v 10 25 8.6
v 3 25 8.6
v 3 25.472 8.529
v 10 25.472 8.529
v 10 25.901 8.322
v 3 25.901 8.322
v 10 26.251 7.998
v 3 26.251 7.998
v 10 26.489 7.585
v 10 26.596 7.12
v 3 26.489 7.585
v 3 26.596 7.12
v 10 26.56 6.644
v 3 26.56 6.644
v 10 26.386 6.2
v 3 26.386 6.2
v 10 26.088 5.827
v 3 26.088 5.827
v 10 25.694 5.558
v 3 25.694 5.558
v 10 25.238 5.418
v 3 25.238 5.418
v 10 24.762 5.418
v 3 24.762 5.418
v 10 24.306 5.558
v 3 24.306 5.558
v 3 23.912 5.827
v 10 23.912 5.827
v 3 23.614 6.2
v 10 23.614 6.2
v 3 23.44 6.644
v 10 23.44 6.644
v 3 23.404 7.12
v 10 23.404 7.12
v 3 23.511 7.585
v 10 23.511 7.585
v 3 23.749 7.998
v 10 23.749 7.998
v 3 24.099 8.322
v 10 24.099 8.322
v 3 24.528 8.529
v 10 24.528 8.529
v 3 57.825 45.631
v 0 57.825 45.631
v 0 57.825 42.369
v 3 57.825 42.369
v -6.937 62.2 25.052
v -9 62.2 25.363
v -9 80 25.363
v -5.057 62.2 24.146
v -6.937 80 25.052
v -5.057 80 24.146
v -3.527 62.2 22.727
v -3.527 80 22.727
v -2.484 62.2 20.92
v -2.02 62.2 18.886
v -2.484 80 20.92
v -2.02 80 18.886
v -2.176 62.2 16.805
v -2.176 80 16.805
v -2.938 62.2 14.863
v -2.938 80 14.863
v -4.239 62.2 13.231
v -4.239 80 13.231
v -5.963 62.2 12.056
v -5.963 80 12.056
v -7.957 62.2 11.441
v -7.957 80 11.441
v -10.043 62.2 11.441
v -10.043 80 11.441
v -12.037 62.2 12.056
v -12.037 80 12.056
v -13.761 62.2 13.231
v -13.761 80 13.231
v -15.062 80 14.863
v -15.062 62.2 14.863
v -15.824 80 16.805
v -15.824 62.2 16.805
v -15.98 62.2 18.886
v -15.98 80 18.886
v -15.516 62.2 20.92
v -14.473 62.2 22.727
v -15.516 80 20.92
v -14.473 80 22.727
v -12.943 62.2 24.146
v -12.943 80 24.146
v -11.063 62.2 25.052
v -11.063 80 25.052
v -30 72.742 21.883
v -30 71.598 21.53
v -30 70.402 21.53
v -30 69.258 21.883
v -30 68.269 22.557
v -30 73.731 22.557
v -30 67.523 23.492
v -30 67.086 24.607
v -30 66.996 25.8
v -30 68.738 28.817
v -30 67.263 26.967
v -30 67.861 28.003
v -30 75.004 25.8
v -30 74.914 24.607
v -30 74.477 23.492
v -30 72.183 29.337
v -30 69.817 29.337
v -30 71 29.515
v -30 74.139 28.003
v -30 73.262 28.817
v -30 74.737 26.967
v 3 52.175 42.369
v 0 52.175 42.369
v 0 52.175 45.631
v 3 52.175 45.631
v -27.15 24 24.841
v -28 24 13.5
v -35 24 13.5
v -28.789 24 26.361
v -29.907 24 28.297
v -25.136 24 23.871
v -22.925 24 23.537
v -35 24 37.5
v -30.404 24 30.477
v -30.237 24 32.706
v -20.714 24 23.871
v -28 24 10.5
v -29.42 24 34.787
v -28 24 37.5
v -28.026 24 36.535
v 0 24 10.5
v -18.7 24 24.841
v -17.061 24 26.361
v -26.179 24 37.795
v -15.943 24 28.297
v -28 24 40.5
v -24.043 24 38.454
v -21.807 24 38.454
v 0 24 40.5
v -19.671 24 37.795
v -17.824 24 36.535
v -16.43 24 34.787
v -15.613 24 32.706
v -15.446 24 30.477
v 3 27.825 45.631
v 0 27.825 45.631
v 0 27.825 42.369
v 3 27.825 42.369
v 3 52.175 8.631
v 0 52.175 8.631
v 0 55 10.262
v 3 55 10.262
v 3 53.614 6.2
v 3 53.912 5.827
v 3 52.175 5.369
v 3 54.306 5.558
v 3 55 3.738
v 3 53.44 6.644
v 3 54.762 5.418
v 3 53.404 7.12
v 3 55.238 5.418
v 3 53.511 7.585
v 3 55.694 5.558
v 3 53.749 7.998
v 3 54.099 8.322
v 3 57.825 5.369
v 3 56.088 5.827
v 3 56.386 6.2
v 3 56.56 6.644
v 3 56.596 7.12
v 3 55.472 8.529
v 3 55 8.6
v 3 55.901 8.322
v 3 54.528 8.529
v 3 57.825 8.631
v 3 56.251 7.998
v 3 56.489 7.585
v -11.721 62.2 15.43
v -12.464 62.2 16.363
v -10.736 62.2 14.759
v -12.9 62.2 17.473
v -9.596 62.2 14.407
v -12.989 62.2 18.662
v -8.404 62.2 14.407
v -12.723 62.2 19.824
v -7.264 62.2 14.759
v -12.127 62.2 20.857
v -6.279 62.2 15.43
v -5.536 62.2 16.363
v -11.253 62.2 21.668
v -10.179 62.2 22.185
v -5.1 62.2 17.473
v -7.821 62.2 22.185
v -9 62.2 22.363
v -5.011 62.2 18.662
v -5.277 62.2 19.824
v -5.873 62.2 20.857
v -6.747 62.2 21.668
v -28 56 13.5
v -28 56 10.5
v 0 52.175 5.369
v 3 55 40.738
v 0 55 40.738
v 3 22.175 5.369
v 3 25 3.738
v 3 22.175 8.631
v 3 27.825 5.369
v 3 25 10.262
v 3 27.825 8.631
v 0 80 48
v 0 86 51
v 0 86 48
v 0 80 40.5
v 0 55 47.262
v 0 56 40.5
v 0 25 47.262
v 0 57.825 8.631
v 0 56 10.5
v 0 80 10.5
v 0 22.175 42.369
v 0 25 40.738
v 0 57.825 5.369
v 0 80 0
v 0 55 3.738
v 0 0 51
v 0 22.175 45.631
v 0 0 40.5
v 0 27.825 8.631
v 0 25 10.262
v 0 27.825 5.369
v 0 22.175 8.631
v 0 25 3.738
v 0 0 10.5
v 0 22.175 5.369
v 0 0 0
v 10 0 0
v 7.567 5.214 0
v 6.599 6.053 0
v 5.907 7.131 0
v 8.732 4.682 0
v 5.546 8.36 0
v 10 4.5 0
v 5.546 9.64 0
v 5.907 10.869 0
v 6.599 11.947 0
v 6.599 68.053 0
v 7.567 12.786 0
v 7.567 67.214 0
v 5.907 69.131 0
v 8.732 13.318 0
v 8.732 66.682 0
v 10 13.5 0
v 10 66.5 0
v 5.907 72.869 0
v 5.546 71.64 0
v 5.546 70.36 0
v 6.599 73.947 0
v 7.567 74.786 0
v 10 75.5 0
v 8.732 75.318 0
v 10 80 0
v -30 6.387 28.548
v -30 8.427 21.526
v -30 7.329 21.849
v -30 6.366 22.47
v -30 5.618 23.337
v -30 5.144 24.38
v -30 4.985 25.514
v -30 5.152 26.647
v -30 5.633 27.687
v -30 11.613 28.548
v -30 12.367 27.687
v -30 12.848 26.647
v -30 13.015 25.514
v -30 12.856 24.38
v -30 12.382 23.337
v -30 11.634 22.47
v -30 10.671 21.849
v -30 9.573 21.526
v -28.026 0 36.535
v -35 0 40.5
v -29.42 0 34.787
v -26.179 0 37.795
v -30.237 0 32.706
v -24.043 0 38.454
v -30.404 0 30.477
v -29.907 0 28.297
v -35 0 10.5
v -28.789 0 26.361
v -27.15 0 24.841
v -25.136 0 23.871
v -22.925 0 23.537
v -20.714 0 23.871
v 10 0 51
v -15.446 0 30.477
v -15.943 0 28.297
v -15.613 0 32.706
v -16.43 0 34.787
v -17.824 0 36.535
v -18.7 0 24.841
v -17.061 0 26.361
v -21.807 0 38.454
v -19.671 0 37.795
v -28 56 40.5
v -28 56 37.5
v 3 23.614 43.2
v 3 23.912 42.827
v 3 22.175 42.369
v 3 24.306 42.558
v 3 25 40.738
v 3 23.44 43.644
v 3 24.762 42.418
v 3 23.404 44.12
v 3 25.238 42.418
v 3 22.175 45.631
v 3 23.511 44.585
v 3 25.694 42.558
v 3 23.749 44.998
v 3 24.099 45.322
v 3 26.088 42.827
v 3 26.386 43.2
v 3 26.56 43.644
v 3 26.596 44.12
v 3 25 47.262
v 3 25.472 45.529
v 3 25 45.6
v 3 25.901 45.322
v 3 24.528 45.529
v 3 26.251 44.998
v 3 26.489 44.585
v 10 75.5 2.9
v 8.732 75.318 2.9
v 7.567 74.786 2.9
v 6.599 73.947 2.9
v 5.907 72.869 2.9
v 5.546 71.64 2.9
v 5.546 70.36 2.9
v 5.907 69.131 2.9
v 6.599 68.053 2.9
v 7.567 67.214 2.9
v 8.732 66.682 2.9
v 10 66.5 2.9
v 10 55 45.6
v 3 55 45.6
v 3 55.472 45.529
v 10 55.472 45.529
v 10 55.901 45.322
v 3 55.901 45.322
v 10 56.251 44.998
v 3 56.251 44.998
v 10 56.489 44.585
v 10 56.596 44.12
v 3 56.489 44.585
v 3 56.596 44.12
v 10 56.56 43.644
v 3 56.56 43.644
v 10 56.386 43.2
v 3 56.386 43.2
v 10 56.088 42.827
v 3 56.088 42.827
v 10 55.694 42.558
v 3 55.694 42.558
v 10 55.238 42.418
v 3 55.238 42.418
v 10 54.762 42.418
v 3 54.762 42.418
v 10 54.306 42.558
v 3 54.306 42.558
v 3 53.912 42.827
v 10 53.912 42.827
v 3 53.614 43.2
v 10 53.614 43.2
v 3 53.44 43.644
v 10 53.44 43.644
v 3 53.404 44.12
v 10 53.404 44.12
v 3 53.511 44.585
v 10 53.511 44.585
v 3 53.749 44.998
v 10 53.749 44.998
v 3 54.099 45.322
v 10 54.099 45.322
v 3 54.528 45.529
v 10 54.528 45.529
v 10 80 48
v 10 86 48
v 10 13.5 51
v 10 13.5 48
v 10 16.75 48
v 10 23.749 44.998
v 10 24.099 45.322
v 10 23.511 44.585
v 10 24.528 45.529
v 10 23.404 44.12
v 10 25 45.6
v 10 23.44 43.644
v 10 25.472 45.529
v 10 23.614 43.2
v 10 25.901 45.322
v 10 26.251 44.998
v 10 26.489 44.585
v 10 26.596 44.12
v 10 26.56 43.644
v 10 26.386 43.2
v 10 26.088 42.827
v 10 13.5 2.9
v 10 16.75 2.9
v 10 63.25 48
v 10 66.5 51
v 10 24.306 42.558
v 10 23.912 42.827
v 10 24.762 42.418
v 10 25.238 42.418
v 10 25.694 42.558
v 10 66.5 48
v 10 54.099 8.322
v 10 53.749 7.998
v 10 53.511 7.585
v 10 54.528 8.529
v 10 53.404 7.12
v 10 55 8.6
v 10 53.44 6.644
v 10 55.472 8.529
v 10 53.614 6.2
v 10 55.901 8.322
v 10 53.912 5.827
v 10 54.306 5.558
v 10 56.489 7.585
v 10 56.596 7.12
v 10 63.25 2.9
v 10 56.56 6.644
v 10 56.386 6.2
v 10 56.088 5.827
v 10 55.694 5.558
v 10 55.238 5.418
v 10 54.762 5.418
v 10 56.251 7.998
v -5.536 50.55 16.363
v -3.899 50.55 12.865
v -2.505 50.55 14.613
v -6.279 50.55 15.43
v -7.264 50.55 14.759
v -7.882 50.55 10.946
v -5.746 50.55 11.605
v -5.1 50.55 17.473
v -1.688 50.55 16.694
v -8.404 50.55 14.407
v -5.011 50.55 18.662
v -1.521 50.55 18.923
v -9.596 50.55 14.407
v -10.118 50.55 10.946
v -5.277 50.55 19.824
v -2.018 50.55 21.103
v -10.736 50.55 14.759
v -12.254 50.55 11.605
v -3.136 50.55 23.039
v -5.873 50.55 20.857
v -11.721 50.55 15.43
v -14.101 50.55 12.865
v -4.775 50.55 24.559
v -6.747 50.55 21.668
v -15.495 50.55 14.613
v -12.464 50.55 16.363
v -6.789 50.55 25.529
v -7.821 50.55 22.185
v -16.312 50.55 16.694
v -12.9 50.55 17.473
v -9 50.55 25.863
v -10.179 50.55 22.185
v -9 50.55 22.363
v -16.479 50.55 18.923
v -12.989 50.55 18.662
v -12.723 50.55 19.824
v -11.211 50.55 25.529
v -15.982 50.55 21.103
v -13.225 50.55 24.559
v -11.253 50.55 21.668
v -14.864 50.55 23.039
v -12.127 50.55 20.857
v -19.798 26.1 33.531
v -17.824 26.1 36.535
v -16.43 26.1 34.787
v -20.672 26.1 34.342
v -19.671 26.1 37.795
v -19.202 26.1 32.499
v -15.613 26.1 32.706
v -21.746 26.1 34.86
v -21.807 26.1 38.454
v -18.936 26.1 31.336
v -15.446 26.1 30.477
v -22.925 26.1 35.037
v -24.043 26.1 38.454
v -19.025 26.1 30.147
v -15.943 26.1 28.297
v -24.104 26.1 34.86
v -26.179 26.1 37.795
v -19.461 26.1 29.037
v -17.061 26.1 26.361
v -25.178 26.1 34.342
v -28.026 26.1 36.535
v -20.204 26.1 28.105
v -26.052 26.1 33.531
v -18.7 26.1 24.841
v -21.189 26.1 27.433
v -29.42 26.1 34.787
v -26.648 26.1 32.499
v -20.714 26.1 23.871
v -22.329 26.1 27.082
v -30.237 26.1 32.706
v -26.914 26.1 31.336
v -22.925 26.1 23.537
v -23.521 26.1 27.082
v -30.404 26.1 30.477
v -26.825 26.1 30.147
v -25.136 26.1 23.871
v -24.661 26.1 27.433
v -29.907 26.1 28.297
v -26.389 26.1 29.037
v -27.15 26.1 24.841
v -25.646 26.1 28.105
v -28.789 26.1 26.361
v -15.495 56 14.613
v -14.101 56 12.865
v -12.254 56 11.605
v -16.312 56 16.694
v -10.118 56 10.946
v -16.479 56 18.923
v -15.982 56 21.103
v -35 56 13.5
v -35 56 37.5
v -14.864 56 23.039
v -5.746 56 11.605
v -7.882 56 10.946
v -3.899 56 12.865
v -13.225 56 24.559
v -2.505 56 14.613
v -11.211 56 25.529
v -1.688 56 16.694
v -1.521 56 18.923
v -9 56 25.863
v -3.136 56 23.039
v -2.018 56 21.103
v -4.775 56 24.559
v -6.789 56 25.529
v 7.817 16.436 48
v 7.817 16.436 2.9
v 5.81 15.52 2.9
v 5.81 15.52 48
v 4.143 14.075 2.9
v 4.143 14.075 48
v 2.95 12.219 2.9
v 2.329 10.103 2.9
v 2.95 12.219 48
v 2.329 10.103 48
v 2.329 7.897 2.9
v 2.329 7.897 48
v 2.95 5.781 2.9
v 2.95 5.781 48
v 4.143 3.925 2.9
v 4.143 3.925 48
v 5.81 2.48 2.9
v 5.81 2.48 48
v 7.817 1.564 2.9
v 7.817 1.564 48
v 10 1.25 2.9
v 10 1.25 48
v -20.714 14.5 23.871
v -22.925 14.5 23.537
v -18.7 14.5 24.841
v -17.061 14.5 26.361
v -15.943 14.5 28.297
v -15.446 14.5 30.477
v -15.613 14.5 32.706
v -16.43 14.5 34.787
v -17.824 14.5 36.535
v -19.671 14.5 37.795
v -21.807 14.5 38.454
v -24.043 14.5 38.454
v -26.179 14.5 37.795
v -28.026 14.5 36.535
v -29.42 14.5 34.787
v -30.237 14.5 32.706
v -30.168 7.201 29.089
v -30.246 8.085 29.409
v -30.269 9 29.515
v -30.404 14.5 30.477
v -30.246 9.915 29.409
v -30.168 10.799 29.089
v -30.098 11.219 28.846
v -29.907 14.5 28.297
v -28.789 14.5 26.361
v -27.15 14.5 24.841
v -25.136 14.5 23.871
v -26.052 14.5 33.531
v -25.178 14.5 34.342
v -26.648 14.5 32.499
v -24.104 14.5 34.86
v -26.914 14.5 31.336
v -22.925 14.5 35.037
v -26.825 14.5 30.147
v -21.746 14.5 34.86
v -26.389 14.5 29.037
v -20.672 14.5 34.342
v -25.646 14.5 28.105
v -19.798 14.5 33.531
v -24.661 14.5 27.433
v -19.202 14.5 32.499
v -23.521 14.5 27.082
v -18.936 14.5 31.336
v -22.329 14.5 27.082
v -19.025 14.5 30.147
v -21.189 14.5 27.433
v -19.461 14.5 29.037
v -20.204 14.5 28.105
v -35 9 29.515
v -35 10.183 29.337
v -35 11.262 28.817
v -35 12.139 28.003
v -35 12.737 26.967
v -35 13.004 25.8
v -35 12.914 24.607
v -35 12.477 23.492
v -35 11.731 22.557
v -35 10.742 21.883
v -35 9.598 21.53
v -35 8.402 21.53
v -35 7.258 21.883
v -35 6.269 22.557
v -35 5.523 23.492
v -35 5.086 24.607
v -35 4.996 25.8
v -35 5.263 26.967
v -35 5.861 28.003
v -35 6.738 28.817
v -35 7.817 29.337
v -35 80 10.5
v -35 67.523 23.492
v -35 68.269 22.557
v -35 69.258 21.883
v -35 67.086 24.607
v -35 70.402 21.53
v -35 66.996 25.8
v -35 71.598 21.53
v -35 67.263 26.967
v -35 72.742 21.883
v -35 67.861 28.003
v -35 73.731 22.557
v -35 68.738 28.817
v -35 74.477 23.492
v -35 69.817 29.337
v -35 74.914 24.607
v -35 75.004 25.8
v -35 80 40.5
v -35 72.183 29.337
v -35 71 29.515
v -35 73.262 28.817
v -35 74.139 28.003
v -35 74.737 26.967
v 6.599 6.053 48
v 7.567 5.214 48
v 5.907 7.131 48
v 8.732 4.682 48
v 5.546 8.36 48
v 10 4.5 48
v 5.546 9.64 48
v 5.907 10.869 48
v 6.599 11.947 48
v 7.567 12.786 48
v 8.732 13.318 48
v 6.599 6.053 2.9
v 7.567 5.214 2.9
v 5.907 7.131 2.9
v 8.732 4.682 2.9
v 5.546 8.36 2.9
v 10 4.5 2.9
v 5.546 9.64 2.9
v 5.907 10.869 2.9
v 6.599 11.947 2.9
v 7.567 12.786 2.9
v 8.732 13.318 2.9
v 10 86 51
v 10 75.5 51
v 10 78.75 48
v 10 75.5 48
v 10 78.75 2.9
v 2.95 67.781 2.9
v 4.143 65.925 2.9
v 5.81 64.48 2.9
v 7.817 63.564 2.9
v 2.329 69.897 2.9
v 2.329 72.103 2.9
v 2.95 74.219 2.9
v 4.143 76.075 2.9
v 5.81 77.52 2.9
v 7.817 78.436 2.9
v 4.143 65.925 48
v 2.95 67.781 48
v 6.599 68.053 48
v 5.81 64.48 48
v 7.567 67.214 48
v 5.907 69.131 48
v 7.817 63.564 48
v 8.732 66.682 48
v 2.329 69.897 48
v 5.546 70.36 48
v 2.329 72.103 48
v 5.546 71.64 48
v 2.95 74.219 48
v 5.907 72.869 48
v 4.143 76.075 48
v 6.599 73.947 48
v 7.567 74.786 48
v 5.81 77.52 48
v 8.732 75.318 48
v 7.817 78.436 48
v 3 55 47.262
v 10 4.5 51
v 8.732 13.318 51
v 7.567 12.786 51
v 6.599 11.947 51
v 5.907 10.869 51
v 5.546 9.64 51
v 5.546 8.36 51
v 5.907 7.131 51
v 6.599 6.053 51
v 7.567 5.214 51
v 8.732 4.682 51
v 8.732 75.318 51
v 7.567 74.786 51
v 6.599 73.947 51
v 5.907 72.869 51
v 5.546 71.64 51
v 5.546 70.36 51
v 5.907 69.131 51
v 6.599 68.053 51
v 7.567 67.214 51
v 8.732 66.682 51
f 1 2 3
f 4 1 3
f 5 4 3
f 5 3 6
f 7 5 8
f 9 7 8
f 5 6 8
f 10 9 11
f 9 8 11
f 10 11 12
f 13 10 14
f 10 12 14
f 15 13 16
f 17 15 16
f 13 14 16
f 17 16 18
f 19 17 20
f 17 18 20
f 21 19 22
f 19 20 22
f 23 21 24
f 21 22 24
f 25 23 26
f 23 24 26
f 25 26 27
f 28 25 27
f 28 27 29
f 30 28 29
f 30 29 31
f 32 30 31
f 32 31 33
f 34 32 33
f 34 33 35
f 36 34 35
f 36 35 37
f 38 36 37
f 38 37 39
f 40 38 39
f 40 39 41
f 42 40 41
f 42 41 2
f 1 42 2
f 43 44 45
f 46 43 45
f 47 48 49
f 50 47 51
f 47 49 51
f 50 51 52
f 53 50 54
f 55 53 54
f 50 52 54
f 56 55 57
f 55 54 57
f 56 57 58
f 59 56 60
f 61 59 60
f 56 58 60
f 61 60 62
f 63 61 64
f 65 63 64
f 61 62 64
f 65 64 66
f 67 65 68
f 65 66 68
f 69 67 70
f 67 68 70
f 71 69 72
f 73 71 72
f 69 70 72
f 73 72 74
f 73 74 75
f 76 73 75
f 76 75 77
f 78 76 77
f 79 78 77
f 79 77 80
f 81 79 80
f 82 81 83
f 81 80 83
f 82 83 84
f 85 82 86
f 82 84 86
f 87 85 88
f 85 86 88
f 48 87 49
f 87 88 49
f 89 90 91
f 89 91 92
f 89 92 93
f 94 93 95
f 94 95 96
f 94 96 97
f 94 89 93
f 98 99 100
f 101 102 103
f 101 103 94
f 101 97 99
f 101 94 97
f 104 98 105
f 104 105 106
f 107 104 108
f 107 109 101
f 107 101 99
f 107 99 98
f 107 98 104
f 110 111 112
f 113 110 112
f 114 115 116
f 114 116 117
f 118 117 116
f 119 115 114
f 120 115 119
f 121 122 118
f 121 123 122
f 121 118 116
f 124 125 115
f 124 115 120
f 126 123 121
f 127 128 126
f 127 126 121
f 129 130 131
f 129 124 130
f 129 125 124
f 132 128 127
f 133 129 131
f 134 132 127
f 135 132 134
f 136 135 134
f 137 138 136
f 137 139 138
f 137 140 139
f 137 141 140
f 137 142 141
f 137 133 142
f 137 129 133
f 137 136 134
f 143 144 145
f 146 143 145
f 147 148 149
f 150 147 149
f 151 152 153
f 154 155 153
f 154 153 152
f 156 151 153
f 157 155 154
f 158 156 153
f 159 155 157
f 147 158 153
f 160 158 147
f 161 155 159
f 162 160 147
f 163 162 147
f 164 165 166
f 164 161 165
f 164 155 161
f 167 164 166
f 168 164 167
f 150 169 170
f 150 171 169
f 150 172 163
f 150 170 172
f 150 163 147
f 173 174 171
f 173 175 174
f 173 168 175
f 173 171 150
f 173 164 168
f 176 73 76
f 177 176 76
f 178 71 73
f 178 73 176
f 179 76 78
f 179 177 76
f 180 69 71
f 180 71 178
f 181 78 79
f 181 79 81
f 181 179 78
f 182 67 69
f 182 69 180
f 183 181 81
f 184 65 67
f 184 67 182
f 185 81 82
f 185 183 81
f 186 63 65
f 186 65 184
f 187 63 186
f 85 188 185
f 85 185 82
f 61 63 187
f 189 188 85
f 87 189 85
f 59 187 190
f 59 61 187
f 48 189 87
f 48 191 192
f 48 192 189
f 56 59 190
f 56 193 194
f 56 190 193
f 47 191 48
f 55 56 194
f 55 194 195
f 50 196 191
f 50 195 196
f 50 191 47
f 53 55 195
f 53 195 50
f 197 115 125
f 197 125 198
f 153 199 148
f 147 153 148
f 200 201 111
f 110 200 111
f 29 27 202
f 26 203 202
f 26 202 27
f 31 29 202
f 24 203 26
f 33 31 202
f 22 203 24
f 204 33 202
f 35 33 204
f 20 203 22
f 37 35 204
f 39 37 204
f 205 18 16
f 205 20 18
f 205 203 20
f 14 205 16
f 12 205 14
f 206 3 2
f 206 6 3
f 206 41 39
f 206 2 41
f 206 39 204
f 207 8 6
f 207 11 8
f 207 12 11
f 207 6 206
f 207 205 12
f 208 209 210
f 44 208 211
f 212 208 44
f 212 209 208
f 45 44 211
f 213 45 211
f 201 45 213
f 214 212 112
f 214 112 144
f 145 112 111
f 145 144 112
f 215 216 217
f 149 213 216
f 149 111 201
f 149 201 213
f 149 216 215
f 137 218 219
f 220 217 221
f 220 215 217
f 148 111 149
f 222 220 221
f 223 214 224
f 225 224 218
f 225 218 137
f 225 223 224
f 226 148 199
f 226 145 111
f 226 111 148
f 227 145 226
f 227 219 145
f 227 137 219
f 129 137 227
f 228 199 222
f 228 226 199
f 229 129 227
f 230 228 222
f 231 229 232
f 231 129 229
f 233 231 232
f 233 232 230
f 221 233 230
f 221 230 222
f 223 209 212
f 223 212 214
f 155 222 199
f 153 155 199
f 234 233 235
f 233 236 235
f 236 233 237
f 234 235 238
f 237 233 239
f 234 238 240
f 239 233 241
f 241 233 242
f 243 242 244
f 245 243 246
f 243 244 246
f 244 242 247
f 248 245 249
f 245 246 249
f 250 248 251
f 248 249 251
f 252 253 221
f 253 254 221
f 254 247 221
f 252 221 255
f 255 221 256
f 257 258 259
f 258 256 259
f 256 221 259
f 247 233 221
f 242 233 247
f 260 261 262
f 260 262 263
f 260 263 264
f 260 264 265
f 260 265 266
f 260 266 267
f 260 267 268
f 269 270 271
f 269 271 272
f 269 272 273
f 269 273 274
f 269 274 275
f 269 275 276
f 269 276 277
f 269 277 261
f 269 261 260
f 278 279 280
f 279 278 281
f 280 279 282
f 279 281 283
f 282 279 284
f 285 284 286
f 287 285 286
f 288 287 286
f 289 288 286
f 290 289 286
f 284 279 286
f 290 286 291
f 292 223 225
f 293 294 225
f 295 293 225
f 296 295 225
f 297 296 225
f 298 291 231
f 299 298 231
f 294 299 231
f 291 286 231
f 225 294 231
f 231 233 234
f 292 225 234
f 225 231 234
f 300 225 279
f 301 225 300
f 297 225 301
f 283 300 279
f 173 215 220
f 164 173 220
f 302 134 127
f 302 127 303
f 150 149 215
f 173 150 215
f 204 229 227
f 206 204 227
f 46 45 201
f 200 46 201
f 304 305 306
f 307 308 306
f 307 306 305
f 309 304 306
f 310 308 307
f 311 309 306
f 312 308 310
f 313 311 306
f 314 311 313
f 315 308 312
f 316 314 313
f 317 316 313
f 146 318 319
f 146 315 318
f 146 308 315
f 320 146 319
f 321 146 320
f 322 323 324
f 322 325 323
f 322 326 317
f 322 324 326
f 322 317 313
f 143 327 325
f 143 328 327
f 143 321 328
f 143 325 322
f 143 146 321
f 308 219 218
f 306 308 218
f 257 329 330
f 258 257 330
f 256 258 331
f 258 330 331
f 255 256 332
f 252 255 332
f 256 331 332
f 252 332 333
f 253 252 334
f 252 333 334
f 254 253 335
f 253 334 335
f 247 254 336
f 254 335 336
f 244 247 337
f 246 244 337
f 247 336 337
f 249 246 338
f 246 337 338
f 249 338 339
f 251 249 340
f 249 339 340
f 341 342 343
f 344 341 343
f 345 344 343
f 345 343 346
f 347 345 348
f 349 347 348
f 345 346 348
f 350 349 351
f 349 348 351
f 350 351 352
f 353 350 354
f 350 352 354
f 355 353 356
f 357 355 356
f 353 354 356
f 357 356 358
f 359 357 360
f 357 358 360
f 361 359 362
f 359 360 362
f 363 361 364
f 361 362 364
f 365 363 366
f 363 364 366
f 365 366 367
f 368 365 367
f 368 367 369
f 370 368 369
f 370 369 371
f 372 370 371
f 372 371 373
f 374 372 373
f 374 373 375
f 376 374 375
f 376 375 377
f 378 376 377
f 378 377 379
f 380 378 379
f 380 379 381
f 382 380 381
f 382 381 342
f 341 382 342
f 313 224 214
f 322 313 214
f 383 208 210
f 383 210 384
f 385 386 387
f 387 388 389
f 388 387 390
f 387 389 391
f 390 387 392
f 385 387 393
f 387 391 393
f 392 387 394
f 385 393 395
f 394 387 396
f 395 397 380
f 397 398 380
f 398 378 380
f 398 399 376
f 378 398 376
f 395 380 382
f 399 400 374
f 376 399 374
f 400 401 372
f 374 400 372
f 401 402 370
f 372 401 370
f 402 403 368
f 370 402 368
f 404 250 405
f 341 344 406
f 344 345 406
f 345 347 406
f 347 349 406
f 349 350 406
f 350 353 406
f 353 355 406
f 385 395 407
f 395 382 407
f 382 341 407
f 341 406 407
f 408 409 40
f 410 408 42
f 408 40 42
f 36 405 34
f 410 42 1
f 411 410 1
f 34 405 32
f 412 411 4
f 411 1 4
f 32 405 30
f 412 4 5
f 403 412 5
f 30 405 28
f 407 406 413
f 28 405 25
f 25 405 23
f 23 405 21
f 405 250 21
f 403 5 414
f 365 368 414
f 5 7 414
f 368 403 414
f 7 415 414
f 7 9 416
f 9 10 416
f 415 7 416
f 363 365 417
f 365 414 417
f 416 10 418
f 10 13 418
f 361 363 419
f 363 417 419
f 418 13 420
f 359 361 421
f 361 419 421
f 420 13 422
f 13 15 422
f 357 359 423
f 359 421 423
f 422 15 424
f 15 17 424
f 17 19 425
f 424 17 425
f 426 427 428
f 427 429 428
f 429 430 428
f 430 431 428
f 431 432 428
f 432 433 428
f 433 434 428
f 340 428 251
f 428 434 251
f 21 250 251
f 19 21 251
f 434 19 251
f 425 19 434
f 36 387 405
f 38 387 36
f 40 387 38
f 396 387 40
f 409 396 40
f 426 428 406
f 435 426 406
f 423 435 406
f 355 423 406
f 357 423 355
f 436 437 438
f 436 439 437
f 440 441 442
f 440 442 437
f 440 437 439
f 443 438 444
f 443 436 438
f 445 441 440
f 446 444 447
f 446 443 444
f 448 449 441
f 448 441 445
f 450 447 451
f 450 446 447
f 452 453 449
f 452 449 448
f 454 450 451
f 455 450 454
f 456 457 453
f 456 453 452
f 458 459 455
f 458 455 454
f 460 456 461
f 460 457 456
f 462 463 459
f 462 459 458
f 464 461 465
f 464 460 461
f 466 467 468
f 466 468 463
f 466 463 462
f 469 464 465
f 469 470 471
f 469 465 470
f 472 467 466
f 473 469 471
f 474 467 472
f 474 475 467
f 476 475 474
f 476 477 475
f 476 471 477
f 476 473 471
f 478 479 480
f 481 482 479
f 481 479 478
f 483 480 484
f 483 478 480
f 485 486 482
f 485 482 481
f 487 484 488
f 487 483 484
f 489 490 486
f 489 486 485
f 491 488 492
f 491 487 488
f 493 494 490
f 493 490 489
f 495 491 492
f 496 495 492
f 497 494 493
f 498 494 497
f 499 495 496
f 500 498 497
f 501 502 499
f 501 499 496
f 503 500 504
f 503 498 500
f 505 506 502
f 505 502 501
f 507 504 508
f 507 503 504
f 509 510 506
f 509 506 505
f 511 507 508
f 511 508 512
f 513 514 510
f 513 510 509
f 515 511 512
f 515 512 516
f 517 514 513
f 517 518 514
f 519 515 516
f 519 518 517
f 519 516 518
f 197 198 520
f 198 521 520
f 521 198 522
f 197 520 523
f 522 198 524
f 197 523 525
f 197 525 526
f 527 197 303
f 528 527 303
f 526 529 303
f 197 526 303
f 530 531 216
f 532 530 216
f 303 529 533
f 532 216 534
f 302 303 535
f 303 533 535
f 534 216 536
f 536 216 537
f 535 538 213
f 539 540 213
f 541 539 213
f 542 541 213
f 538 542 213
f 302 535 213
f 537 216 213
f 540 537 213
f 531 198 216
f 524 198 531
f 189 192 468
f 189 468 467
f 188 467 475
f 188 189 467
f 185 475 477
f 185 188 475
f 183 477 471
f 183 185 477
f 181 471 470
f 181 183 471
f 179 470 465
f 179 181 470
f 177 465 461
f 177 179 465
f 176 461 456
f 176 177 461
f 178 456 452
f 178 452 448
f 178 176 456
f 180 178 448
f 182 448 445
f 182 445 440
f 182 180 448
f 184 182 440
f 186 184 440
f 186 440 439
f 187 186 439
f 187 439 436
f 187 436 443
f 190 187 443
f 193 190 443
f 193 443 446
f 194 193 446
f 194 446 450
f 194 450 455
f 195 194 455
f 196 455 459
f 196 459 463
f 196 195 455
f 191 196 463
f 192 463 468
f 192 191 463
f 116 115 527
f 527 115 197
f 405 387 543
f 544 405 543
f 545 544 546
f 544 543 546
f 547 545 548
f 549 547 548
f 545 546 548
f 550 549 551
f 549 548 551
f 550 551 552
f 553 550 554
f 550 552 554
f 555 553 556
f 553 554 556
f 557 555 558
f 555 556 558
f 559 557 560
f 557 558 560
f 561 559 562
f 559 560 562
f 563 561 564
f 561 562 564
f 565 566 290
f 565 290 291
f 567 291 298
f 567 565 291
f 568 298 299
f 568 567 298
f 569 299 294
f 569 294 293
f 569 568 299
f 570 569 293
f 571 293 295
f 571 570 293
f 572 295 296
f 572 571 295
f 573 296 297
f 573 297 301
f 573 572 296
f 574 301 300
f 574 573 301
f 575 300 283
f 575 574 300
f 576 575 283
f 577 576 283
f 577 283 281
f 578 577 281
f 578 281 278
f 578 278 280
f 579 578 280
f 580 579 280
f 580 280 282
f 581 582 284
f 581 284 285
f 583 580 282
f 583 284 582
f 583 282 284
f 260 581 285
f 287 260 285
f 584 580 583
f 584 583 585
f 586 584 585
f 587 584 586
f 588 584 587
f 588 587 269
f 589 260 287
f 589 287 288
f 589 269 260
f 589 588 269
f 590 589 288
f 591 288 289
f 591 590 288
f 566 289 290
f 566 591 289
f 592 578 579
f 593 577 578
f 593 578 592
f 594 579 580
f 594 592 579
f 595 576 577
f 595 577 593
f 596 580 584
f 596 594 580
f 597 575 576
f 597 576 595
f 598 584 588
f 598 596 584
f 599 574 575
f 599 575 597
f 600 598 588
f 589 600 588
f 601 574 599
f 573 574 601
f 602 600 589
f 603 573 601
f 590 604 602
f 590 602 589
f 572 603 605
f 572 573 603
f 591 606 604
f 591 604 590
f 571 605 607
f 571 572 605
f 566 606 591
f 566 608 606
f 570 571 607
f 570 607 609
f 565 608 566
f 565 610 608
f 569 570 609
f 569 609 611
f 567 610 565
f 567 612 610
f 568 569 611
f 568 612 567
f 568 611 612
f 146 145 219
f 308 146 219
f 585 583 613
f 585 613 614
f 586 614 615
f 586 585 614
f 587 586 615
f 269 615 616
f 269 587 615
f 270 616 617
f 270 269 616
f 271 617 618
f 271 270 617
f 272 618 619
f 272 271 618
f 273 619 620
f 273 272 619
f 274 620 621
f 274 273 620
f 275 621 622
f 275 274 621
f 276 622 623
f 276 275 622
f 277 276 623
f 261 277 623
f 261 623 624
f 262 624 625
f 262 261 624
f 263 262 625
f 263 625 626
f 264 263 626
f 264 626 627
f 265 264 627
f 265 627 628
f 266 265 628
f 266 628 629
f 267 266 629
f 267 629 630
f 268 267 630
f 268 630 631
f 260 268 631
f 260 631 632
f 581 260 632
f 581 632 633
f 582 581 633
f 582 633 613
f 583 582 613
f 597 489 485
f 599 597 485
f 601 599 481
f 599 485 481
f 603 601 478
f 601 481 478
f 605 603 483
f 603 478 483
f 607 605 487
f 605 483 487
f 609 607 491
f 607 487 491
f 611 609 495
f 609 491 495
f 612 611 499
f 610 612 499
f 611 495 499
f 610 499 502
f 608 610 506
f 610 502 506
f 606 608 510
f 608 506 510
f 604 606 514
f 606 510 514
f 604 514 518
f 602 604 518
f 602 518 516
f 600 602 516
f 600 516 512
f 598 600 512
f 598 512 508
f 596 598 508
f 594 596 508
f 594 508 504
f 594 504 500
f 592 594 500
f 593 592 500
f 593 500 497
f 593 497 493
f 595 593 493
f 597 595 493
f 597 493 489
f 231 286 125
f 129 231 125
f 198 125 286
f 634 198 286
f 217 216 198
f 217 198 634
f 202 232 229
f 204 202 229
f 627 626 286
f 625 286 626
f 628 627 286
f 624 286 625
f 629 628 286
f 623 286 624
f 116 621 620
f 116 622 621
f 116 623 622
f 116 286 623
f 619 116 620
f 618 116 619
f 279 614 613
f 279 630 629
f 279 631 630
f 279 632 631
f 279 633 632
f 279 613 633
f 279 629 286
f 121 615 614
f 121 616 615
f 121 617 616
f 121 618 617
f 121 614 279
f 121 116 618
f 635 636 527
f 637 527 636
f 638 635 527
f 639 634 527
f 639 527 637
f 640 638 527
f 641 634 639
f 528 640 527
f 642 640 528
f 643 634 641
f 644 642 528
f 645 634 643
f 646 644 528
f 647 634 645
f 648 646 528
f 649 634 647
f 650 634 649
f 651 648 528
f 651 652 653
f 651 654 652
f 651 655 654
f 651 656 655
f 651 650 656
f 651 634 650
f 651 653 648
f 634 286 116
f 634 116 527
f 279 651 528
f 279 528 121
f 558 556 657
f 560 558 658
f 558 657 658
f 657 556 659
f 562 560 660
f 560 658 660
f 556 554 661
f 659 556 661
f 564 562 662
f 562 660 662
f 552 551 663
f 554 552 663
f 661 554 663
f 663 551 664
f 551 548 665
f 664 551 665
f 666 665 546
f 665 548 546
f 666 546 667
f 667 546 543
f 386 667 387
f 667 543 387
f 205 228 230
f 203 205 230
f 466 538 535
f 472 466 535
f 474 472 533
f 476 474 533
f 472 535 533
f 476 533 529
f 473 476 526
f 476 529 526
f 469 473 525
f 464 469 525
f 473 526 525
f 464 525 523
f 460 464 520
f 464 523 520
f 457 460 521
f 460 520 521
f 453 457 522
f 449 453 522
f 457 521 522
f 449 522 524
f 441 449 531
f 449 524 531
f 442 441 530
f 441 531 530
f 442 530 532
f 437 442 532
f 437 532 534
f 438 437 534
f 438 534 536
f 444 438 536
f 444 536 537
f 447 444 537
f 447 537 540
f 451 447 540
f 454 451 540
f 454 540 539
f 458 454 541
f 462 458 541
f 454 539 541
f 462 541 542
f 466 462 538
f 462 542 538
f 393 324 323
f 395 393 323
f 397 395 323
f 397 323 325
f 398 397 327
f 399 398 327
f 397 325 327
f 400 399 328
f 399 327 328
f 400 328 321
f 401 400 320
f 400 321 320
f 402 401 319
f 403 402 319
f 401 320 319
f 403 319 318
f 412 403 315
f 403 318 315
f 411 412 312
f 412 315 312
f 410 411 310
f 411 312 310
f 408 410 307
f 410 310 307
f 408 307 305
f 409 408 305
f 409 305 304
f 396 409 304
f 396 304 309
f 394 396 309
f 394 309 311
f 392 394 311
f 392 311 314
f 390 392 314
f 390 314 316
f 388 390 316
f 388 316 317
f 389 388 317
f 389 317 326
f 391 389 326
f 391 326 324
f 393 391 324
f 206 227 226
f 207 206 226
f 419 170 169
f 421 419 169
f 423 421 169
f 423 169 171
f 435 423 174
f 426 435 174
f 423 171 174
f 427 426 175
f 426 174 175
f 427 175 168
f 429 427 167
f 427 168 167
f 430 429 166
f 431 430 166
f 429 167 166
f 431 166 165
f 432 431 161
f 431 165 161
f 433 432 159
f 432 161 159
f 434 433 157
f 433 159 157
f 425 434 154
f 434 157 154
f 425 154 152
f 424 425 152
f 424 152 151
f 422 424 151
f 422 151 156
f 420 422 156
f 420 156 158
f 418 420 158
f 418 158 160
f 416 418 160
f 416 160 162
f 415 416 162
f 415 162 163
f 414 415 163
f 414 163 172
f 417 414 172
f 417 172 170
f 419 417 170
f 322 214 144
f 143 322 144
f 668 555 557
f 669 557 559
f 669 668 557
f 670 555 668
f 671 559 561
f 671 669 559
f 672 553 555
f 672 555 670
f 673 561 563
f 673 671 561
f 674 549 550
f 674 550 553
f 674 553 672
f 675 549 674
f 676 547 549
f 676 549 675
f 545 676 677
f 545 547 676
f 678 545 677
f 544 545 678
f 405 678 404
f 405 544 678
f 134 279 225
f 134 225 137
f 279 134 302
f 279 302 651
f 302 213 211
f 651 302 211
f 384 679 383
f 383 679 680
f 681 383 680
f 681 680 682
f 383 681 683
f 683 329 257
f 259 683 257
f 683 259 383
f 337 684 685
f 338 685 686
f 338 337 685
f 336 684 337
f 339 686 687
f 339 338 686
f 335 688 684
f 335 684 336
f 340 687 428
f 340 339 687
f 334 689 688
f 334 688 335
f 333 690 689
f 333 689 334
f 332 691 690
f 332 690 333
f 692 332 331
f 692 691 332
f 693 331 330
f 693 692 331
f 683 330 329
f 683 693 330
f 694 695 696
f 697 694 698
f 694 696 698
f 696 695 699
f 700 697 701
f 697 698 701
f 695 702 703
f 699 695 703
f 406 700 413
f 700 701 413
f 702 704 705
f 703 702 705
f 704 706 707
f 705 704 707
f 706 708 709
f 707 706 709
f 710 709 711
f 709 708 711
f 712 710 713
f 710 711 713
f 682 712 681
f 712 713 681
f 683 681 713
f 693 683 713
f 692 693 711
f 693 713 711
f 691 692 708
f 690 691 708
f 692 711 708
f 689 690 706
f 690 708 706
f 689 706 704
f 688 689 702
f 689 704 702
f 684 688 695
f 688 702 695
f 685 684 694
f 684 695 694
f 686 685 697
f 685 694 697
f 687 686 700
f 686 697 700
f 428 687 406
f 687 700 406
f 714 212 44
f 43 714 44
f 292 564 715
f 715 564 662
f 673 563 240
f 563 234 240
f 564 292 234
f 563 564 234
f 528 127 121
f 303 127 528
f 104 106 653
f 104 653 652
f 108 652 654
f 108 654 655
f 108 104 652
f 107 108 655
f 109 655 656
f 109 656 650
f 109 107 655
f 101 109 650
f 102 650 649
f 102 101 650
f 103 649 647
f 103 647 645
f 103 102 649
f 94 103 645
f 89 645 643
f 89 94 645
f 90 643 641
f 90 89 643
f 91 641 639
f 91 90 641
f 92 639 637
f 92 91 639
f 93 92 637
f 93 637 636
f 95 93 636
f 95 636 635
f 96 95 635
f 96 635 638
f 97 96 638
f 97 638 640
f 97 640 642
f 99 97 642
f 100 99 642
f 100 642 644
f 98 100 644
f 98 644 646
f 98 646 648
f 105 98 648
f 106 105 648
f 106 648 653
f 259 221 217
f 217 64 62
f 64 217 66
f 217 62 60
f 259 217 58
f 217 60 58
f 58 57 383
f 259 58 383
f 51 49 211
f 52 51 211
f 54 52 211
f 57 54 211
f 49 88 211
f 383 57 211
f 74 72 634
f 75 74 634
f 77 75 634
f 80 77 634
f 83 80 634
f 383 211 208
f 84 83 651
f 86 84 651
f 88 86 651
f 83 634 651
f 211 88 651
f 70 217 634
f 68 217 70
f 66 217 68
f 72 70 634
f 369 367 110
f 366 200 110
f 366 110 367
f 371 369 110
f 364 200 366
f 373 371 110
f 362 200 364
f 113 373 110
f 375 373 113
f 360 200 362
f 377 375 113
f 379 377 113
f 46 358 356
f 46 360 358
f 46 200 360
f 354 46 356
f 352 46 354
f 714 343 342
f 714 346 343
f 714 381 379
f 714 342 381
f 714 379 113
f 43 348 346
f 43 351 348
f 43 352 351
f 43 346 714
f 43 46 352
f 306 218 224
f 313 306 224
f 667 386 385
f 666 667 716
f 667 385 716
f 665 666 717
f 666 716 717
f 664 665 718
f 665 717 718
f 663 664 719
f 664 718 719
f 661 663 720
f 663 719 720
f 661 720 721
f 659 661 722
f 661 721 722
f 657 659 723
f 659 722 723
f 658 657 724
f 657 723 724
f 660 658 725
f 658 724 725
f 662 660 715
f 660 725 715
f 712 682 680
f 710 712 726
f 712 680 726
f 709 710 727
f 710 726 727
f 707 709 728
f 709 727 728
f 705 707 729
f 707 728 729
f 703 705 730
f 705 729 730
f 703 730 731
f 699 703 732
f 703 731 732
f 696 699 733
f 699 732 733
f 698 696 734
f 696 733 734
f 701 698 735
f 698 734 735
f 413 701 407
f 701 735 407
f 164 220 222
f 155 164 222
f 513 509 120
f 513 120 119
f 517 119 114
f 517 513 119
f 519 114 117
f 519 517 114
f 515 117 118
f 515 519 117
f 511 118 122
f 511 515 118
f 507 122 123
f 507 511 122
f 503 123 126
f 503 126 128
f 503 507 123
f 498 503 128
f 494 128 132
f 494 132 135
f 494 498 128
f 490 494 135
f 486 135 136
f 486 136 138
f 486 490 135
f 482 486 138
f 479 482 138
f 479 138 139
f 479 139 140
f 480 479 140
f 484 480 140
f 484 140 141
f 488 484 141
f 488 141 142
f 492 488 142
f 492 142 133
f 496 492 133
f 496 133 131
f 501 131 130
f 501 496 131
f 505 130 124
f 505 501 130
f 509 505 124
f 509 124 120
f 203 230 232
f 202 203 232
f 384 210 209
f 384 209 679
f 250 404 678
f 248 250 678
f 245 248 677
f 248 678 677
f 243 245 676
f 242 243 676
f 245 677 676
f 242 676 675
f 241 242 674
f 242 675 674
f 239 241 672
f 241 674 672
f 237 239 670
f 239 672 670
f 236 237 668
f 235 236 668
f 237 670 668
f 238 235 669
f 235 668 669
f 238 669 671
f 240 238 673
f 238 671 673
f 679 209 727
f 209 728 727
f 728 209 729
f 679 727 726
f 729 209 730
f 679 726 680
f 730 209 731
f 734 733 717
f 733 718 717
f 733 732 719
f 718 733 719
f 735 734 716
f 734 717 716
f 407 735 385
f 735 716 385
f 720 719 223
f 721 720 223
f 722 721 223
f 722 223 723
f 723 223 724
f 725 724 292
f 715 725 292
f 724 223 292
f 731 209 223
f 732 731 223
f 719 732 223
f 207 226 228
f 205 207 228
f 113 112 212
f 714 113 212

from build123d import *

# Parameters (mm, degrees)
SKETCH1_W            = 10
SKETCH1_H            = 80
BOSS_EXTRUDE1_DEPTH  = 51
SKETCH2_R            = 7.75
CUT_EXTRUDE1_DEPTH   = 45.1
SKETCH3_R            = 4.5
CUT_EXTRUDE2_DEPTH   = 96.399161422
SKETCH4_W            = 30
SKETCH4_H            = 80
SKETCH4_R            = 4.015
BOSS_EXTRUDE2_DEPTH  = 35
SKETCH4_3_R          = 4.015
BOSS_EXTRUDE3_DEPTH  = 30
CUT_EXTRUDE3_START   = -35
SKETCH5_W            = 24
SKETCH5_H            = 32
CUT_EXTRUDE3_DEPTH   = 35
SKETCH6_W            = 28
SKETCH6_H            = 32
CUT_EXTRUDE4_DEPTH   = 97.256168633
SKETCH12_W           = 10
SKETCH12_H           = 3
BOSS_EXTRUDE6_DEPTH  = 6
SKETCH14_R           = 1.6
CUT_EXTRUDE8_DEPTH   = 3
SKETCH14_2_R         = 1.6
CUT_EXTRUDE9_DEPTH   = 106.933941681
SKETCH15_R           = 4
CUT_EXTRUDE10_DEPTH  = 102.123686642
BOSS_EXTRUDE7_START  = 2.1
SKETCH16_R           = 7.5
SKETCH16_R_2         = 4
BOSS_EXTRUDE7_DEPTH  = 2.1
CUT_EXTRUDE11_START  = -14.5
SKETCH17_R           = 7.5
CUT_EXTRUDE11_DEPTH  = 14.5
SKETCH18_R           = 7.5
SKETCH18_R_2         = 4
BOSS_EXTRUDE8_DEPTH  = 5.45
SKETCH19_R           = 7
CUT_EXTRUDE12_DEPTH  = 17.8
SKETCH20_R           = 4
BOSS_EXTRUDE9_DEPTH  = 24
BOSS_EXTRUDE10_START = -24
SKETCH21_R           = 4
BOSS_EXTRUDE10_DEPTH = 24


with BuildPart() as part:
    # Sketch1 → Boss-Extrude1 (new body)
    with BuildSketch(Plane.XY):
        with Locations((5, 40)):
            Rectangle(SKETCH1_W, SKETCH1_H)
    extrude(amount=BOSS_EXTRUDE1_DEPTH)

    # Sketch2 → Cut-Extrude1 (cut)
    with BuildSketch(Plane.XY.offset(48)):
        with Locations((10, 9)):
            Circle(SKETCH2_R)
        with Locations((10, 71)):
            Circle(SKETCH2_R)
    extrude(amount=-CUT_EXTRUDE1_DEPTH, mode=Mode.SUBTRACT)

    # Sketch3 → Cut-Extrude2 (cut, through all)
    with BuildSketch(Plane.XY.offset(51)):
        with Locations((10, 71)):
            Circle(SKETCH3_R)
        with Locations((10, 9)):
            Circle(SKETCH3_R)
    extrude(amount=-CUT_EXTRUDE2_DEPTH, mode=Mode.SUBTRACT)

    # Sketch4 → Boss-Extrude2 (add)
    with BuildSketch(Plane.ZY):
        with Locations((25.5, 40)):
            Rectangle(SKETCH4_W, SKETCH4_H)
        with Locations((25.5, 71)):
            Circle(SKETCH4_R, mode=Mode.SUBTRACT)
        with Locations((25.5, 9)):
            Circle(SKETCH4_R, mode=Mode.SUBTRACT)
    extrude(amount=BOSS_EXTRUDE2_DEPTH)

    # Sketch4<3> → Boss-Extrude3 (add)
    with BuildSketch(Plane.ZY):
        with Locations((25.5, 71)):
            Circle(SKETCH4_3_R)
        with Locations((25.5, 9)):
            Circle(SKETCH4_3_R)
    extrude(amount=BOSS_EXTRUDE3_DEPTH)

    # Sketch5 → Cut-Extrude3 (cut)
    with BuildSketch(Plane.ZY.offset(35).offset(CUT_EXTRUDE3_START)):
        with Locations((25.5, 40)):
            Rectangle(SKETCH5_W, SKETCH5_H)
    extrude(amount=CUT_EXTRUDE3_DEPTH, mode=Mode.SUBTRACT)

    # Sketch6 → Cut-Extrude4 (cut, through all)
    with BuildSketch(Plane.XY.offset(40.5)):
        with Locations((-14, 40)):
            Rectangle(SKETCH6_W, SKETCH6_H)
    extrude(amount=-CUT_EXTRUDE4_DEPTH, mode=Mode.SUBTRACT)

    # Sketch12 → Boss-Extrude6 (add)
    with BuildSketch(Plane(origin=(0, 80, 0), x_dir=(1, 0, 0), z_dir=(0, 1, 0))):
        with Locations((5, -49.5)):
            Rectangle(SKETCH12_W, SKETCH12_H)
    extrude(amount=BOSS_EXTRUDE6_DEPTH)

    # Sketch14 → Cut-Extrude8 (cut)
    # profile 1 of 4: a face of its own
    with BuildSketch(Plane.ZY):
        Polygon((10.262029021, 55), (8.63101451, 57.825), (5.36898549, 57.825), (3.737970979, 55), (5.36898549, 52.175), (8.63101451, 52.175), align=None)
        with Locations((7, 55)):
            Circle(SKETCH14_R, mode=Mode.SUBTRACT)
    # profile 2 of 4: a face of its own
    with BuildSketch(Plane.ZY):
        Polygon((47.262029021, 55), (45.63101451, 57.825), (42.36898549, 57.825), (40.737970979, 55), (42.36898549, 52.175), (45.63101451, 52.175), align=None)
        with Locations((44, 55)):
            Circle(SKETCH14_R, mode=Mode.SUBTRACT)
    # profile 3 of 4: a face of its own
    with BuildSketch(Plane.ZY):
        Polygon((47.262029021, 25), (45.63101451, 27.825), (42.36898549, 27.825), (40.737970979, 25), (42.36898549, 22.175), (45.63101451, 22.175), align=None)
        with Locations((44, 25)):
            Circle(SKETCH14_R, mode=Mode.SUBTRACT)
    # profile 4 of 4: a face of its own
    with BuildSketch(Plane.ZY):
        Polygon((10.262029021, 25), (8.63101451, 27.825), (5.36898549, 27.825), (3.737970979, 25), (5.36898549, 22.175), (8.63101451, 22.175), align=None)
        with Locations((7, 25)):
            Circle(SKETCH14_R, mode=Mode.SUBTRACT)
    extrude(amount=-CUT_EXTRUDE8_DEPTH, mode=Mode.SUBTRACT)

    # Sketch14<2> → Cut-Extrude9 (cut, through all)
    with BuildSketch(Plane.ZY):
        with Locations((7, 55)):
            Circle(SKETCH14_2_R)
        with Locations((44, 55)):
            Circle(SKETCH14_2_R)
        with Locations((44, 25)):
            Circle(SKETCH14_2_R)
        with Locations((7, 25)):
            Circle(SKETCH14_2_R)
    extrude(amount=-CUT_EXTRUDE9_DEPTH, mode=Mode.SUBTRACT)

    # Sketch15 → Cut-Extrude10 (cut, through all)
    with BuildSketch(Plane(origin=(0, 80, 0), x_dir=(1, 0, 0), z_dir=(0, 1, 0))):
        with Locations(Location((-9, -18.3627, 0), (0, 0, 270))):
            Circle(SKETCH15_R)
        with Locations(Location((-22.925, -31.0373, 0), (0, 0, 270))):
            Circle(SKETCH15_R)
    extrude(amount=-CUT_EXTRUDE10_DEPTH, mode=Mode.SUBTRACT)

    # Sketch16 → Boss-Extrude7 (add)
    with BuildSketch(Plane(origin=(0, 24, 0), x_dir=(1, 0, 0), z_dir=(0, 1, 0)).offset(BOSS_EXTRUDE7_START)):
        with Locations(Location((-22.925, -31.0373, 0), (0, 0, 90))):
            Circle(SKETCH16_R)
        with Locations(Location((-22.925, -31.0373, 0), (0, 0, 270))):
            Circle(SKETCH16_R_2, mode=Mode.SUBTRACT)
    extrude(amount=-BOSS_EXTRUDE7_DEPTH)

    # Sketch17 → Cut-Extrude11 (cut)
    with BuildSketch(Plane.XZ.offset(CUT_EXTRUDE11_START)):
        with Locations(Location((-22.925, 31.0373, 0), (0, 0, 270))):
            Circle(SKETCH17_R)
    extrude(amount=CUT_EXTRUDE11_DEPTH, mode=Mode.SUBTRACT)

    # Sketch18 → Boss-Extrude8 (add)
    with BuildSketch(Plane.XZ.offset(-56)):
        with Locations(Location((-9, 18.3627, 0), (0, 0, 90))):
            Circle(SKETCH18_R)
        with Locations(Location((-9, 18.3627, 0), (0, 0, 90))):
            Circle(SKETCH18_R_2, mode=Mode.SUBTRACT)
    extrude(amount=BOSS_EXTRUDE8_DEPTH)

    # Sketch19 → Cut-Extrude12 (cut)
    with BuildSketch(Plane(origin=(0, 80, 0), x_dir=(1, 0, 0), z_dir=(0, 1, 0))):
        with Locations(Location((-9, -18.3627, 0), (0, 0, 270))):
            Circle(SKETCH19_R)
    extrude(amount=-CUT_EXTRUDE12_DEPTH, mode=Mode.SUBTRACT)

    # Sketch20 → Boss-Extrude9 (add)
    with BuildSketch(Plane(origin=(0, 24, 0), x_dir=(1, 0, 0), z_dir=(0, 1, 0))):
        with Locations(Location((-9, -18.3627, 0), (0, 0, 270))):
            Circle(SKETCH20_R)
    extrude(amount=-BOSS_EXTRUDE9_DEPTH)

    # Sketch21 → Boss-Extrude10 (add)
    with BuildSketch(Plane.XZ.offset(-56).offset(BOSS_EXTRUDE10_START)):
        with Locations(Location((-22.925, 31.0373, 0), (0, 0, 90))):
            Circle(SKETCH21_R)
    extrude(amount=BOSS_EXTRUDE10_DEPTH)


solid = part.part
